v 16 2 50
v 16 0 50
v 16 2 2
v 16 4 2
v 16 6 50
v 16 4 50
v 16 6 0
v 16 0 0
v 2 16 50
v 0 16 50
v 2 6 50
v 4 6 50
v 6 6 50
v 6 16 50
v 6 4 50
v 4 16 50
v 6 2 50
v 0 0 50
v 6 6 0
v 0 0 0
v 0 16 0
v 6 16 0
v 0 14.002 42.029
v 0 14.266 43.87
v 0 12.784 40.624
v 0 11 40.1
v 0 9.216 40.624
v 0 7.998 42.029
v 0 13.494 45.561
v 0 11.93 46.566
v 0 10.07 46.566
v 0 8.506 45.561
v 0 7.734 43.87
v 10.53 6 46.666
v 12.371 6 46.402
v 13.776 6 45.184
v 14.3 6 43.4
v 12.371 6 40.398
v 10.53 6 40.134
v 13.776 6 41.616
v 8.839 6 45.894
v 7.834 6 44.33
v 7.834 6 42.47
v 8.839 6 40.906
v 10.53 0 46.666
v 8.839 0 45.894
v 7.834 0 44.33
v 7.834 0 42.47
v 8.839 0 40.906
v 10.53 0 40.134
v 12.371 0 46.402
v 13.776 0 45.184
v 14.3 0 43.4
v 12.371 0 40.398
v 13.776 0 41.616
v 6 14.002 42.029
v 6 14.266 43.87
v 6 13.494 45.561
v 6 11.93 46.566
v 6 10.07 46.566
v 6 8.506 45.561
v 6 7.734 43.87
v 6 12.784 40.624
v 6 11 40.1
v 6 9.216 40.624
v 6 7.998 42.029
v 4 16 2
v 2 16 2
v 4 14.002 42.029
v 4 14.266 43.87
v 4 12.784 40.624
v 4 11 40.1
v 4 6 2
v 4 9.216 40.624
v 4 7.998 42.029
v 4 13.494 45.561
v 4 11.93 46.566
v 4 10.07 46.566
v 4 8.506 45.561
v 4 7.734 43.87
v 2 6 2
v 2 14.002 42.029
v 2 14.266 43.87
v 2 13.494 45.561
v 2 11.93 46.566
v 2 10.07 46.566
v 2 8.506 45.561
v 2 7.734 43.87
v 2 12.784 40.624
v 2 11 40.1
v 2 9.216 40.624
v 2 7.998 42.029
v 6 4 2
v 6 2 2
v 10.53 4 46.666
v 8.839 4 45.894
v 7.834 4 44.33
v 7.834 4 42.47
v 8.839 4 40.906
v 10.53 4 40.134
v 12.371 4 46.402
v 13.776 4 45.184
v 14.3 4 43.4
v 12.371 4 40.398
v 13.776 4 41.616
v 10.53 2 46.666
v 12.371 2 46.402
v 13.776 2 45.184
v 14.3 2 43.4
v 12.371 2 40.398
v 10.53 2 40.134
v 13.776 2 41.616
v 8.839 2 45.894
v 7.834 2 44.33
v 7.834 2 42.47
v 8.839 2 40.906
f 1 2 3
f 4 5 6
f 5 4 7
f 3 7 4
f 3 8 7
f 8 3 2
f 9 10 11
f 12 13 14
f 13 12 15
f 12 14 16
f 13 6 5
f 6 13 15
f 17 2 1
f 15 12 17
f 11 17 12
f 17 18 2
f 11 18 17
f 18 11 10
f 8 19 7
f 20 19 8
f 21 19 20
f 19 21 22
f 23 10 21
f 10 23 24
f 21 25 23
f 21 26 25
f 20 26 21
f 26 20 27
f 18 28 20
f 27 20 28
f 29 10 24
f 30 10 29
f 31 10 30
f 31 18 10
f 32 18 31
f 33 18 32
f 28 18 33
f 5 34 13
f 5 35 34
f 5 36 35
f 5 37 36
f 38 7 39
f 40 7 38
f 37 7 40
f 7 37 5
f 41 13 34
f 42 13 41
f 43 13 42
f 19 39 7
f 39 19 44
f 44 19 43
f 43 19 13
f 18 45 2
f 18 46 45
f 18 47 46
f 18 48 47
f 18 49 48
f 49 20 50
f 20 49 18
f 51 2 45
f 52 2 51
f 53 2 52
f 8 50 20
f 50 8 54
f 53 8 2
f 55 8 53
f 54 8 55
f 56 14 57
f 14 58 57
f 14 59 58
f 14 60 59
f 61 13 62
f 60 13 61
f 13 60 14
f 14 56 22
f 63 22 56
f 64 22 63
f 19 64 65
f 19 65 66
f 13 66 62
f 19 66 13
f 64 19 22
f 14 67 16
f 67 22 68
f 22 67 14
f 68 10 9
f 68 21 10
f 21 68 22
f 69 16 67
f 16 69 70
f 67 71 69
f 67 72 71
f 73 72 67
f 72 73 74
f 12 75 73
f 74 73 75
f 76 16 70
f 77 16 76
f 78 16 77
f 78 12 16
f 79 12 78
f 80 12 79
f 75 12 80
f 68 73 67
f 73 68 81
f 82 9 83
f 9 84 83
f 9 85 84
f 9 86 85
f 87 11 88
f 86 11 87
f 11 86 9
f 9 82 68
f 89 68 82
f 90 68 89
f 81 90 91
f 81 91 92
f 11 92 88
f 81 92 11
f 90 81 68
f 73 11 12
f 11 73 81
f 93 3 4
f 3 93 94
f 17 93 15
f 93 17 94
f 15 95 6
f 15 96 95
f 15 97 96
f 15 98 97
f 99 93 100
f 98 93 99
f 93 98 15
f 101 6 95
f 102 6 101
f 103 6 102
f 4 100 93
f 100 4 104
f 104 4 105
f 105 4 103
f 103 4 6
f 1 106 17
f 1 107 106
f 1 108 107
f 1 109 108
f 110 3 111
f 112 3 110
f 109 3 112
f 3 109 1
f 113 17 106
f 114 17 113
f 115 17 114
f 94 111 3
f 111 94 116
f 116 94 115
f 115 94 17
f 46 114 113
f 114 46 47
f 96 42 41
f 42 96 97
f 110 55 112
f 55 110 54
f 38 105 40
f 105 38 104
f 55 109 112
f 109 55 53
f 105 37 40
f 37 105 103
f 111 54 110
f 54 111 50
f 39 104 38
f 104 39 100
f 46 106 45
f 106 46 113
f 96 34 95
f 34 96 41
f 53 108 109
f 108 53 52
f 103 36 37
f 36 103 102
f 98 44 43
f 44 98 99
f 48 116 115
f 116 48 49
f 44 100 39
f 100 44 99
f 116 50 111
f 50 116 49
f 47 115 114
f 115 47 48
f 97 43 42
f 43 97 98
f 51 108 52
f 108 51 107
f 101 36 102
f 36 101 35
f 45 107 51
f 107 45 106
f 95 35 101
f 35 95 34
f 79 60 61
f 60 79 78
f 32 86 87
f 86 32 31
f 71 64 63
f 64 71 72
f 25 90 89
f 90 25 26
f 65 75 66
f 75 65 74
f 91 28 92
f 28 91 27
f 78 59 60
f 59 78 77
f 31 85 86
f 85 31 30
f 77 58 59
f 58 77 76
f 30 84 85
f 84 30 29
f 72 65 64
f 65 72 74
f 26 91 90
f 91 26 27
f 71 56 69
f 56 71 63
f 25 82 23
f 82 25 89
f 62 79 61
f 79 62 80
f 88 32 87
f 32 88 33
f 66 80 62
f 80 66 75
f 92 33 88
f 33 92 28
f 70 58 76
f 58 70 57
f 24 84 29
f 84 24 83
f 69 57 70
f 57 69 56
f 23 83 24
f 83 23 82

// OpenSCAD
height               = 50;   // Height, mm
wall_thickness_inner = 2;    // Wall thickness (inner), mm
wall_thickness_outer = 2;    // Wall thickness (outer), mm
slot_size            = 10;   // Slot size, mm
floor_thickness      = 2;    // Floor thickness, mm
screw_hole_size      = 3.3;  // Screw hole size, mm

total_thickness = wall_thickness_inner + wall_thickness_outer * 2;
difference()
{
    union()
    {
        cube([total_thickness + slot_size, total_thickness, height]);
        cube([total_thickness, total_thickness + slot_size, height]);
    }
    translate([(total_thickness - wall_thickness_inner) / 2, total_thickness, floor_thickness]) {
        cube([wall_thickness_inner, slot_size, height]);    
    }
    translate([total_thickness, (total_thickness - wall_thickness_inner) / 2, floor_thickness]) {
        cube([slot_size, wall_thickness_inner, height]);    
    }
    translate([total_thickness + slot_size / 2, 0, height - screw_hole_size * 2]) {
        rotate([-90, 0, 0]) {
            cylinder(r = screw_hole_size, h = total_thickness, center = false);
        }
    }
    translate([0, total_thickness + slot_size / 2, height - screw_hole_size * 2]) {
        rotate([0, 90, 0]) {
            cylinder(r = screw_hole_size, h = total_thickness, center = false);
        }
    }
}
